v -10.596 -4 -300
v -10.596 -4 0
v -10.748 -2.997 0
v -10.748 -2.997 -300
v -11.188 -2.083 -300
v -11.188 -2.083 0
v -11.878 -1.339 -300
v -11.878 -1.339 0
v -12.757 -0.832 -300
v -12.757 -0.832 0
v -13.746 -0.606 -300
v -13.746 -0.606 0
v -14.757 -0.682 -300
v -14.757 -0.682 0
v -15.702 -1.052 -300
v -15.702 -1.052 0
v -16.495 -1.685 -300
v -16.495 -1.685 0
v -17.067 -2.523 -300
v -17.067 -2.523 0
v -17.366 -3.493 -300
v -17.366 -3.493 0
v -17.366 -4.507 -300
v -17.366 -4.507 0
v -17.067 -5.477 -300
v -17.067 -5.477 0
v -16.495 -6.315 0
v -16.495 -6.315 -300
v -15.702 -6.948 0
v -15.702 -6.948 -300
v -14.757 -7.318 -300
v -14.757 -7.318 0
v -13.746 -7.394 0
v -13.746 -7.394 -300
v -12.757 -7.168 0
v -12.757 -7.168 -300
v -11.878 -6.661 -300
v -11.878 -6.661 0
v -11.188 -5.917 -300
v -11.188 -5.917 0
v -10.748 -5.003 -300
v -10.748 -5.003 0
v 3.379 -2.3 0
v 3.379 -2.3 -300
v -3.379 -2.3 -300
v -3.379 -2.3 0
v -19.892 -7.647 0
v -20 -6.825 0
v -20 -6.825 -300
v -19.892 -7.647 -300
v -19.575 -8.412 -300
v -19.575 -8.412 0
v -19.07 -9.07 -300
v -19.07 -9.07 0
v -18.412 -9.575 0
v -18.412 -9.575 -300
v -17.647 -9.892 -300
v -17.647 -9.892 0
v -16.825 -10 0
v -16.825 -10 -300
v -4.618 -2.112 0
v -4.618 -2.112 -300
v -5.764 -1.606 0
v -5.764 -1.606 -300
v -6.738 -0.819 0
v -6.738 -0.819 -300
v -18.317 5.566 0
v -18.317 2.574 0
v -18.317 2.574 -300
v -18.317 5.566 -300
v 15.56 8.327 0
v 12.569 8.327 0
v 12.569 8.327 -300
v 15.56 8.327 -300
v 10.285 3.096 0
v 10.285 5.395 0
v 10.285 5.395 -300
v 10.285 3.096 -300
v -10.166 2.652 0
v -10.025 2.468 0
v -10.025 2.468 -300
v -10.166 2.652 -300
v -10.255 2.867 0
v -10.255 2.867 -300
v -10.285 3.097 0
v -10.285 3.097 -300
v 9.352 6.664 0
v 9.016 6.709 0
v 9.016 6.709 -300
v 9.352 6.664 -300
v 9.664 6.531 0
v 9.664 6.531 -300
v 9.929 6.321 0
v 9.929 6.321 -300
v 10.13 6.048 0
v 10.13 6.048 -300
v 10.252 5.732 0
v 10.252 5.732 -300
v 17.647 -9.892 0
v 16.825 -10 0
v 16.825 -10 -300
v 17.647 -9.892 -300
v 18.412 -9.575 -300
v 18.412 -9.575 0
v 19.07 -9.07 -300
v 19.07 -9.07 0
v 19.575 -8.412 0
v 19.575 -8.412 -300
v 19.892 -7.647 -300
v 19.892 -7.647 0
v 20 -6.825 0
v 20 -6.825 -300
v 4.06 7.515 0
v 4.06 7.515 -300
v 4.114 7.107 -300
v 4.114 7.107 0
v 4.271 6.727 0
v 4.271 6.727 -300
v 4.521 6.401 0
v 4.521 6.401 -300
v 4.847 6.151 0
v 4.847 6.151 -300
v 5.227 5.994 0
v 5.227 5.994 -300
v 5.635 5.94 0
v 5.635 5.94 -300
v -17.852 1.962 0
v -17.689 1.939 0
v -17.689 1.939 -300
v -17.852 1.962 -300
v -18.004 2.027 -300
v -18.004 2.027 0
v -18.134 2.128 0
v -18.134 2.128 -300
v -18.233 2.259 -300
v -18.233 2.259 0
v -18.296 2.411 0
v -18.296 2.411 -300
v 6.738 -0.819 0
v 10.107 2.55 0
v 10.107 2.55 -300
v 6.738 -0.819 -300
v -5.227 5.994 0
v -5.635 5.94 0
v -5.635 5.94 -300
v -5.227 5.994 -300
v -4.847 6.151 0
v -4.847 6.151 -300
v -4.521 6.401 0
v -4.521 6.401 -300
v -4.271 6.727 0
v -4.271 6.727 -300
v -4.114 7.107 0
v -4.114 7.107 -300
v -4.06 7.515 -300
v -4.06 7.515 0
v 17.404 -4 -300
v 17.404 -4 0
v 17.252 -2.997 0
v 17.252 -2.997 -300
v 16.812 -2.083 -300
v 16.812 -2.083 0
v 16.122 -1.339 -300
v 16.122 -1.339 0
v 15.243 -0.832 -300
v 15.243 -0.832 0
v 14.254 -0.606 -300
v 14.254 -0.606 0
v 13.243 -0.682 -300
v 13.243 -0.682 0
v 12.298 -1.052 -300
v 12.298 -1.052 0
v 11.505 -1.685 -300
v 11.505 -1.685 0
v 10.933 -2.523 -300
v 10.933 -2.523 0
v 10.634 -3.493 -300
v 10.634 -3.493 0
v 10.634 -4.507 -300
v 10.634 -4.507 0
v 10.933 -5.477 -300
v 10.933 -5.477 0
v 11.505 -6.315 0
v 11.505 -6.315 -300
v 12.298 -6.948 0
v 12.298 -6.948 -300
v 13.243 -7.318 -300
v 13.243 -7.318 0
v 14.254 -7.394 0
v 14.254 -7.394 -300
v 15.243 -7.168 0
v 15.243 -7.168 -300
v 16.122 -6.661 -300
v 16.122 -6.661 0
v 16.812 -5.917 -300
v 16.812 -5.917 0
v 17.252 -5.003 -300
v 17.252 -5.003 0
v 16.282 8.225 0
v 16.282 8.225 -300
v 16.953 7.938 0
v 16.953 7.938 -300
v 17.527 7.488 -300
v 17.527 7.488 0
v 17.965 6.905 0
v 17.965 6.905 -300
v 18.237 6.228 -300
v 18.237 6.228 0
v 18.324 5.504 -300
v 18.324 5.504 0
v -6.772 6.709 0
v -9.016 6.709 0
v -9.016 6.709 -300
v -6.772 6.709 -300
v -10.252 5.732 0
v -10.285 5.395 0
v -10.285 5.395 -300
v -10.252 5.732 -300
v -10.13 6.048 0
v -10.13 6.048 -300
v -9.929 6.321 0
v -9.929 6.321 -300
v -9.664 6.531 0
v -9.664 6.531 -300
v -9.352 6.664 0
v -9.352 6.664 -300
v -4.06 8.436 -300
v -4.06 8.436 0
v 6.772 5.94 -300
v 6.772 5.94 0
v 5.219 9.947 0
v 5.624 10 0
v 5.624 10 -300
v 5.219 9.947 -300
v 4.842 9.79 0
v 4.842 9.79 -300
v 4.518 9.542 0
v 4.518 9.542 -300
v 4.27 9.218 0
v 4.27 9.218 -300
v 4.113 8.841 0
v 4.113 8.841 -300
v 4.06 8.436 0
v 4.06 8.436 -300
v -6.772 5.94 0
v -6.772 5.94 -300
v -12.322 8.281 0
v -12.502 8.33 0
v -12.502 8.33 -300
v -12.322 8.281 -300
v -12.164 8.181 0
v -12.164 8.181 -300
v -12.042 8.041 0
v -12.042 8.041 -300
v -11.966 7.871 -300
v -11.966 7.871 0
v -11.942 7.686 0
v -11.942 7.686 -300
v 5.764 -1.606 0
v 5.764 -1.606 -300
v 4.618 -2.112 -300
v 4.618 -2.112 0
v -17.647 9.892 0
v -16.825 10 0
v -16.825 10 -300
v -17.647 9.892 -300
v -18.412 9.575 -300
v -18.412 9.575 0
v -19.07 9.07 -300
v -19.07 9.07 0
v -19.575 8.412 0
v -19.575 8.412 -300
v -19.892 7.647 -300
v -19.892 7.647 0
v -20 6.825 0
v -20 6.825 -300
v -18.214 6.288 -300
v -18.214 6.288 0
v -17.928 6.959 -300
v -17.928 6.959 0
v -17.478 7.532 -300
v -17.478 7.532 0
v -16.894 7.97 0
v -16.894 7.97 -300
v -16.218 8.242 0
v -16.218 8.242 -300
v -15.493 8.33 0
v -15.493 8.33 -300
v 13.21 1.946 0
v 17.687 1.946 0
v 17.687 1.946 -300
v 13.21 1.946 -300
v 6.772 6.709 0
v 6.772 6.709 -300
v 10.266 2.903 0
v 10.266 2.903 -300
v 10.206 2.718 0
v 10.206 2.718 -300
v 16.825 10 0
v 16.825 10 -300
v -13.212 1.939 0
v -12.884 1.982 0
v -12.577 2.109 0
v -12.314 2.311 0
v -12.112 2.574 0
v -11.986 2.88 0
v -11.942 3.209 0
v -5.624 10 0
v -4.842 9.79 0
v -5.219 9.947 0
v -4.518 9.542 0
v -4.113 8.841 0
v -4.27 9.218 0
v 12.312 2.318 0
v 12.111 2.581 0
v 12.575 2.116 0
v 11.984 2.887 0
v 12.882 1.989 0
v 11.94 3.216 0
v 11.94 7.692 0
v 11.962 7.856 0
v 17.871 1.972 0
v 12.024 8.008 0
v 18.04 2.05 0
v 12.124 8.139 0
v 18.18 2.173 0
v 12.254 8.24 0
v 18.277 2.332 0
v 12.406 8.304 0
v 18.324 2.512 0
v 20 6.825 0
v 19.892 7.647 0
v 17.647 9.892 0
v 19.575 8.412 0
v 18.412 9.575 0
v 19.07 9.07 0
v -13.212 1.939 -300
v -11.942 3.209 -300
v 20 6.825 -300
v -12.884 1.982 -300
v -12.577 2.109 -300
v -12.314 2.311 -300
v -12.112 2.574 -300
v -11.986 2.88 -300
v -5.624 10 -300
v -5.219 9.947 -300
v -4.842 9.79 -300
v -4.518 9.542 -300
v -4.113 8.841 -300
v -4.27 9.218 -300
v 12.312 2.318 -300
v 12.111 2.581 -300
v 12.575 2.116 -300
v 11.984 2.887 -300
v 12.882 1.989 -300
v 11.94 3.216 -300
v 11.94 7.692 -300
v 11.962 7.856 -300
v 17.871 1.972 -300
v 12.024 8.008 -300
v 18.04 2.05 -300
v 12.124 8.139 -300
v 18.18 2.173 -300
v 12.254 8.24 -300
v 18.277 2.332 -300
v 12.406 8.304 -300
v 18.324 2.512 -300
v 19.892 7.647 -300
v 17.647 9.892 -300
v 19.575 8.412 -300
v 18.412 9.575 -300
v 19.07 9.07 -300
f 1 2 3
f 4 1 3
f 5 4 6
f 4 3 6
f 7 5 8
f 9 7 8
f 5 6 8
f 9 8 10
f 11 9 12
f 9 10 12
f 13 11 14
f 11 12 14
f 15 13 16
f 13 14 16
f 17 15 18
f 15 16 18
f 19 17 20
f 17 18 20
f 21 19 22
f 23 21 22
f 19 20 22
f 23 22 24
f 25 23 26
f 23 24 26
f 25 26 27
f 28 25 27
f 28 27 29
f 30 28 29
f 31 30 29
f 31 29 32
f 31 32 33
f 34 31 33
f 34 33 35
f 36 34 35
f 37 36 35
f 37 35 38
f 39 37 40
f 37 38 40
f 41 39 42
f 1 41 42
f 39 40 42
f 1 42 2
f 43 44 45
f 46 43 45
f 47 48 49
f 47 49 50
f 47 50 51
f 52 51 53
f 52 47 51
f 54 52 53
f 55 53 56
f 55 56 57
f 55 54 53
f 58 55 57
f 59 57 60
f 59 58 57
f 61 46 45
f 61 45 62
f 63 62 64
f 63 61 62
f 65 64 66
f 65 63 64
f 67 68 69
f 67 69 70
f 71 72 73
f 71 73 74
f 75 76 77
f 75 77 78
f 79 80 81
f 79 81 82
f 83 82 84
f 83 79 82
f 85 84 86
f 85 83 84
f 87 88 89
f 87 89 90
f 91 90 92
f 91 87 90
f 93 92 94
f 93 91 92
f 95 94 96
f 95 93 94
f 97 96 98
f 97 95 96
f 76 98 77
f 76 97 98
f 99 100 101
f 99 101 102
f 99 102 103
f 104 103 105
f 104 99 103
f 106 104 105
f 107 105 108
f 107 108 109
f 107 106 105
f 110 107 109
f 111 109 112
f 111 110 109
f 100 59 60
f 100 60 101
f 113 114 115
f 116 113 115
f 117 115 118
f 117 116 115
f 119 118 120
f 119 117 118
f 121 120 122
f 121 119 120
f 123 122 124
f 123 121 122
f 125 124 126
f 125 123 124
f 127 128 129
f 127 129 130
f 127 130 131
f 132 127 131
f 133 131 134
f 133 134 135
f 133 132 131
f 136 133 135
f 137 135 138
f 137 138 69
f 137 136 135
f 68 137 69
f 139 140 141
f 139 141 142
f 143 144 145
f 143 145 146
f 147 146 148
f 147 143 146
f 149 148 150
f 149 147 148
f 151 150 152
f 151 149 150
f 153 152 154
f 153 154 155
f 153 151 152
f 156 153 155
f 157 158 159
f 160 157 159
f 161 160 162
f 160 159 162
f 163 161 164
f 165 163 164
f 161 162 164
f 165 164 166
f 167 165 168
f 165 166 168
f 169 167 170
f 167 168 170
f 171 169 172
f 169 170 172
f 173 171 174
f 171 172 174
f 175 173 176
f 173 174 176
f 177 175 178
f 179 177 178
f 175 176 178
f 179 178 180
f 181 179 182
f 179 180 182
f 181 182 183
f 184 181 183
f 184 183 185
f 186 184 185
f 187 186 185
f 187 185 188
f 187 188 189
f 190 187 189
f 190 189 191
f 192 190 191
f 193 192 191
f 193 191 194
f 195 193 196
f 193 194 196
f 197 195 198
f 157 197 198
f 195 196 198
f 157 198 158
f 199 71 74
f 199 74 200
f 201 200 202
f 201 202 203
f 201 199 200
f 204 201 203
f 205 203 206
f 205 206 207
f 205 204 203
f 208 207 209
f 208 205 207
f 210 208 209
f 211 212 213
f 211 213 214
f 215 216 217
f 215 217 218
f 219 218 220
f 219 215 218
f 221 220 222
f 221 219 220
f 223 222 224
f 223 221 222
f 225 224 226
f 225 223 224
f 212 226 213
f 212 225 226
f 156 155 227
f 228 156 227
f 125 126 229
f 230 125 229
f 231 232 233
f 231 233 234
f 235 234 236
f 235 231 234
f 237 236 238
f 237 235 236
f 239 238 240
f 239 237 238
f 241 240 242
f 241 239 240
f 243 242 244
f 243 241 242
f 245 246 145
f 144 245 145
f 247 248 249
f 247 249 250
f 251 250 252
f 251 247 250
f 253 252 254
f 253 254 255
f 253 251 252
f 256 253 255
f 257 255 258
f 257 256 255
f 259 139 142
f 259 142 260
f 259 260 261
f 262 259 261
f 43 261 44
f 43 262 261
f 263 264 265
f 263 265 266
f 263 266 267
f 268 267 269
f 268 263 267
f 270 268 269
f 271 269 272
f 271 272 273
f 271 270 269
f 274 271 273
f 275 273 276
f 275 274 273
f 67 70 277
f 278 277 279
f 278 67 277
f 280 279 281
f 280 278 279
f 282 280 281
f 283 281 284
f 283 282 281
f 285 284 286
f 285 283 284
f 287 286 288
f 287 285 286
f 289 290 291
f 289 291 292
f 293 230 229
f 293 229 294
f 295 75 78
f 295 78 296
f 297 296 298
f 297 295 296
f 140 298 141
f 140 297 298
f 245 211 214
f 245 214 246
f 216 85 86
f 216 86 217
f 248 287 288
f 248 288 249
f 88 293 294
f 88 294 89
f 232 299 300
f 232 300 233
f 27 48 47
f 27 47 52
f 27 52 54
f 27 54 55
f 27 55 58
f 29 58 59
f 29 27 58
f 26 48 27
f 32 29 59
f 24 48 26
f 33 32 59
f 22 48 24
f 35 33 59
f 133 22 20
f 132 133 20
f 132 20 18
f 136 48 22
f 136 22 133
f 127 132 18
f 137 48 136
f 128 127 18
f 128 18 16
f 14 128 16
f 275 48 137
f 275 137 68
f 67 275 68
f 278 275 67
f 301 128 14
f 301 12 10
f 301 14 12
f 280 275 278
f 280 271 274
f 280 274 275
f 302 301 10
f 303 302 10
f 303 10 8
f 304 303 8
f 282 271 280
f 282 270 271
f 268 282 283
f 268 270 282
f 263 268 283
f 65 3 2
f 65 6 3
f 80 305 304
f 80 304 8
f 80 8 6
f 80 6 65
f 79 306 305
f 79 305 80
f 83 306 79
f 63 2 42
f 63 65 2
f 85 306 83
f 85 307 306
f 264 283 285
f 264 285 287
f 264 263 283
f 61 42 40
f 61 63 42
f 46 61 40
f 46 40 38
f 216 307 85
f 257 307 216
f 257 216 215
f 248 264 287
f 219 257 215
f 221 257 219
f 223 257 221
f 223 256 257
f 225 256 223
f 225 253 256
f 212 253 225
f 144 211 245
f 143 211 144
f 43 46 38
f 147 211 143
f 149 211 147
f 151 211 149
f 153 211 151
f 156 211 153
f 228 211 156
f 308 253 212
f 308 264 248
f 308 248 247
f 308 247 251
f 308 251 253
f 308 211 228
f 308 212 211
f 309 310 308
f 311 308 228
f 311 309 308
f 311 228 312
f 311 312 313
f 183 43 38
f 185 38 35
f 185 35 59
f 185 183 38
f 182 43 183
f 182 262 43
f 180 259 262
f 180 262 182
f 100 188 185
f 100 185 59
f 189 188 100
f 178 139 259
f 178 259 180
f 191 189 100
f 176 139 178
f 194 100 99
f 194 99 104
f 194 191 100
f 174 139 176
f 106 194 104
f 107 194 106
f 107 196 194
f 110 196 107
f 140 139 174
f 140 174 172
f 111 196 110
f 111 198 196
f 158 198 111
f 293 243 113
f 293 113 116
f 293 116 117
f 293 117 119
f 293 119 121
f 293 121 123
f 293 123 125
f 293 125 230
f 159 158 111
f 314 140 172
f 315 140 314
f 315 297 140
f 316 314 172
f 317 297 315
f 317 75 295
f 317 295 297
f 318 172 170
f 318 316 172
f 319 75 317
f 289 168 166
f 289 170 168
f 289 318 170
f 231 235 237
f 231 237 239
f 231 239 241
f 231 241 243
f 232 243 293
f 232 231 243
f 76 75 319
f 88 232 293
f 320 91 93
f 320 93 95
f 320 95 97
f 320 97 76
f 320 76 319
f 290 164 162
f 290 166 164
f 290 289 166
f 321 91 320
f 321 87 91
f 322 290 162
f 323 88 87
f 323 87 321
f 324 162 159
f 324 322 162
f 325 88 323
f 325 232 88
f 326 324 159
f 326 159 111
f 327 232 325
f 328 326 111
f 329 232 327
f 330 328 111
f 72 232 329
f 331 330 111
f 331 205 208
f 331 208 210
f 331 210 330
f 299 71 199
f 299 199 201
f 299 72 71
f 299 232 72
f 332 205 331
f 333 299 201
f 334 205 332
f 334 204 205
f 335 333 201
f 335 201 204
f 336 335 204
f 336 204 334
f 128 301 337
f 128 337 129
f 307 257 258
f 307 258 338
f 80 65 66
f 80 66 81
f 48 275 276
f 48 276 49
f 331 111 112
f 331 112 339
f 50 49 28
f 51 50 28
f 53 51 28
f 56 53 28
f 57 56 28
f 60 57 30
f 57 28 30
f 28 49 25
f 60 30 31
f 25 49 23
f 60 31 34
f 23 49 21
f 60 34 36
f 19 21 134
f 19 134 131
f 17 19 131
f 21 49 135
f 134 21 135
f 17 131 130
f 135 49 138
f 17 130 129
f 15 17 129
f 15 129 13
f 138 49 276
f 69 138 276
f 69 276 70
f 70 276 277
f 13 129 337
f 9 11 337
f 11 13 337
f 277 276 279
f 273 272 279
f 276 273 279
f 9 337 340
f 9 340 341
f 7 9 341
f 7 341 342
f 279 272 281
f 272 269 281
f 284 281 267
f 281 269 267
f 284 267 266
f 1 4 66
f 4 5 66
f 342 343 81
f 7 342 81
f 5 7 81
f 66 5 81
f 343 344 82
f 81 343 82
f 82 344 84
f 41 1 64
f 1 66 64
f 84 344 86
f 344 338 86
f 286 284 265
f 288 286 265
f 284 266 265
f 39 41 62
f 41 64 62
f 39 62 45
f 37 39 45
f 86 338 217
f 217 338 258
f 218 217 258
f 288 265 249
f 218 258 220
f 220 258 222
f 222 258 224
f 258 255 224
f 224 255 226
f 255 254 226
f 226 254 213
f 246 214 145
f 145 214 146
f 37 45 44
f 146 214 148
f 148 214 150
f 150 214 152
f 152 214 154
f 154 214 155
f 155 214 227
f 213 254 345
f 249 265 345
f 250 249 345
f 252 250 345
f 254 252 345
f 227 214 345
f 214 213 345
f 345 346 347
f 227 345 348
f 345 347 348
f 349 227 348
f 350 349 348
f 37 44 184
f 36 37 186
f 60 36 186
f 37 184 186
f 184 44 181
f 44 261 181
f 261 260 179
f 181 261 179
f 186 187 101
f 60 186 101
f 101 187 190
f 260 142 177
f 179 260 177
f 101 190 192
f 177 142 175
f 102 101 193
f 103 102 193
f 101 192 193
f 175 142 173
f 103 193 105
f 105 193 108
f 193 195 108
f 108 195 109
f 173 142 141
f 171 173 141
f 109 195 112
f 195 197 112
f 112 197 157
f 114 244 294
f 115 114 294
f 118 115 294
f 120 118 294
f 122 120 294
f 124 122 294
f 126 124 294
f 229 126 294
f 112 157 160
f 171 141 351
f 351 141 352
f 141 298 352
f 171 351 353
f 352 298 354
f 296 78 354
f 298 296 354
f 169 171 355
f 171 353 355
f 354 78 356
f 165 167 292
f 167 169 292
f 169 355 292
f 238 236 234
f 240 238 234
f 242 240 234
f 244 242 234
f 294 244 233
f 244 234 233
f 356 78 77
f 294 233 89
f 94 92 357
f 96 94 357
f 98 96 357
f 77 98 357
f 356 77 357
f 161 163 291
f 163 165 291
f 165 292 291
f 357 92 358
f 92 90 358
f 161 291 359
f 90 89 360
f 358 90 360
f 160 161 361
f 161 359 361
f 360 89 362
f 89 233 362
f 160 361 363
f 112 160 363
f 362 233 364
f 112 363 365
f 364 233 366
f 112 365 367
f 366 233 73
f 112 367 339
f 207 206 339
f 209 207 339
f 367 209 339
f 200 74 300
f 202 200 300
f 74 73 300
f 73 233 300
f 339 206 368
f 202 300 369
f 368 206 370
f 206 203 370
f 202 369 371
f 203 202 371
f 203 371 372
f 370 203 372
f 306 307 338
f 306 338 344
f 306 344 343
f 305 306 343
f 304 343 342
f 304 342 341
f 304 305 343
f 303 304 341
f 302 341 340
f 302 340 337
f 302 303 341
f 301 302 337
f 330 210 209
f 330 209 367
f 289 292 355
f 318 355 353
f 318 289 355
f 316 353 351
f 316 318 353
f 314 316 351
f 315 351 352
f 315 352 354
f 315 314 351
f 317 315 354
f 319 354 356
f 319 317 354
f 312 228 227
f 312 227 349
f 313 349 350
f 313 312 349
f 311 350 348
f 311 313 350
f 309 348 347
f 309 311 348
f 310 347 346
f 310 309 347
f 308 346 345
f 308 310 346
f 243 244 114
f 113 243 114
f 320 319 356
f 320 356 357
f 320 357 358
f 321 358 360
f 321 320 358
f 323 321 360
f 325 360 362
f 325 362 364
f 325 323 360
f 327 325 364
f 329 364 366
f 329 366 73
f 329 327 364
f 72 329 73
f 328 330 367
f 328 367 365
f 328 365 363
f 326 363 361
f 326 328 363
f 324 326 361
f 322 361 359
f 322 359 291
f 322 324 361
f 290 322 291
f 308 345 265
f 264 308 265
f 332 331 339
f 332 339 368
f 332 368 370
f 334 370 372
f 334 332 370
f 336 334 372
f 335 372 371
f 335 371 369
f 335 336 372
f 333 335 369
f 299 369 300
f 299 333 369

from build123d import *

# Parameters (mm, degrees)
SKETCH1_R      = 3.4036
EXTRUDE1_DEPTH = 300


with BuildPart() as part:
    # Sketch1 → Extrude1 (new body)
    with BuildSketch(Plane.XY):
        with BuildLine():
            Line((-20, 6.825), (-20, -6.825))
            ThreePointArc((-20, -6.825), (-19.07006403, -9.07006403), (-16.825, -10))
            Line((-16.825, -10), (16.825, -10))
            ThreePointArc((16.825, -10), (19.07006403, -9.07006403), (20, -6.825))
            Line((20, -6.825), (20, 6.825))
            ThreePointArc((20, 6.825), (19.07006403, 9.07006403), (16.825, 10))
            Line((16.825, 10), (13.01772333, 10))
            Line((13.01772333, 10), (5.624351215, 10))
            ThreePointArc((5.624351215, 10), (4.518187863, 9.541812137), (4.06, 8.435648785))
            Line((4.06, 8.435648785), (4.06, 7.5148))
            ThreePointArc((4.06, 7.5148), (4.521248241, 6.401248241), (5.6348, 5.94))
            Line((5.6348, 5.94), (6.771827505, 5.94))
            Line((6.771827505, 5.94), (6.771827505, 6.708913257))
            Line((6.771827505, 6.708913257), (9.01577365, 6.708913257))
            ThreePointArc((9.01577365, 6.708913257), (9.929335196, 6.321129388), (10.285, 5.394590897))
            Line((10.285, 5.394590897), (10.285, 3.096216247))
            ThreePointArc((10.285, 3.096216247), (10.241244142, 2.808525014), (10.106931233, 2.550376096))
            Line((10.106931233, 2.550376096), (6.737817619, -0.818737518))
            ThreePointArc((6.737817619, -0.818737518), (5.207385794, -1.896930484), (3.37920183, -2.3))
            Line((3.37920183, -2.3), (-3.37920183, -2.3))
            ThreePointArc((-3.37920183, -2.3), (-5.207385794, -1.896930484), (-6.737817619, -0.818737518))
            Line((-6.737817619, -0.818737518), (-10.024617928, 2.468062791))
            ThreePointArc((-10.024617928, 2.468062791), (-10.217328904, 2.756475149), (-10.285, 3.09668072))
            Line((-10.285, 3.09668072), (-10.285, 5.394590897))
            ThreePointArc((-10.285, 5.394590897), (-9.929335196, 6.321129388), (-9.01577365, 6.708913257))
            Line((-9.01577365, 6.708913257), (-6.771827505, 6.708913257))
            Line((-6.771827505, 6.708913257), (-6.771827505, 5.94))
            Line((-6.771827505, 5.94), (-5.6348, 5.94))
            ThreePointArc((-5.6348, 5.94), (-4.521248241, 6.401248241), (-4.06, 7.5148))
            Line((-4.06, 7.5148), (-4.06, 8.435648785))
            ThreePointArc((-4.06, 8.435648785), (-4.518187863, 9.541812137), (-5.624351215, 10))
            Line((-5.624351215, 10), (-13.017278808, 10))
            Line((-13.017278808, 10), (-16.825, 10))
            ThreePointArc((-16.825, 10), (-19.07006403, 9.07006403), (-20, 6.825))
        make_face()
        with Locations((-14, -4)):
            Circle(SKETCH1_R, mode=Mode.SUBTRACT)
        with Locations((14, -4)):
            Circle(SKETCH1_R, mode=Mode.SUBTRACT)
        with BuildLine():
            Line((-13.212346722, 1.939194793), (-17.688897149, 1.939194793))
            ThreePointArc((-17.688897149, 1.939194793), (-18.133514414, 2.127552649), (-18.31710748, 2.574158493))
            Line((-18.31710748, 2.574158493), (-18.31710748, 5.56561917))
            ThreePointArc((-18.31710748, 5.56561917), (-17.477686114, 7.532412526), (-15.493392654, 8.329584904))
            Line((-15.493392654, 8.329584904), (-12.501931977, 8.329584904))
            ThreePointArc((-12.501931977, 8.329584904), (-12.097931082, 8.115619133), (-11.942346722, 7.68574522))
            Line((-11.942346722, 7.68574522), (-11.942346722, 3.209194793))
            ThreePointArc((-11.942346722, 3.209194793), (-12.31432111, 2.31116918), (-13.212346722, 1.939194793))
        make_face(mode=Mode.SUBTRACT)
        with BuildLine():
            Line((18.32404339, 5.503747464), (18.32404339, 2.512286787))
            ThreePointArc((18.32404339, 2.512286787), (18.11465108, 2.106331374), (17.686957075, 1.945948162))
            Line((17.686957075, 1.945948162), (13.210406647, 1.945948162))
            ThreePointArc((13.210406647, 1.945948162), (12.312381035, 2.31792255), (11.940406647, 3.215948162))
            Line((11.940406647, 3.215948162), (11.940406647, 7.692498589))
            ThreePointArc((11.940406647, 7.692498589), (12.123999713, 8.139104433), (12.568616978, 8.327462289))
            Line((12.568616978, 8.327462289), (15.560077655, 8.327462289))
            ThreePointArc((15.560077655, 8.327462289), (17.526871011, 7.488040923), (18.32404339, 5.503747464))
        make_face(mode=Mode.SUBTRACT)
    extrude(amount=-EXTRUDE1_DEPTH)


solid = part.part
